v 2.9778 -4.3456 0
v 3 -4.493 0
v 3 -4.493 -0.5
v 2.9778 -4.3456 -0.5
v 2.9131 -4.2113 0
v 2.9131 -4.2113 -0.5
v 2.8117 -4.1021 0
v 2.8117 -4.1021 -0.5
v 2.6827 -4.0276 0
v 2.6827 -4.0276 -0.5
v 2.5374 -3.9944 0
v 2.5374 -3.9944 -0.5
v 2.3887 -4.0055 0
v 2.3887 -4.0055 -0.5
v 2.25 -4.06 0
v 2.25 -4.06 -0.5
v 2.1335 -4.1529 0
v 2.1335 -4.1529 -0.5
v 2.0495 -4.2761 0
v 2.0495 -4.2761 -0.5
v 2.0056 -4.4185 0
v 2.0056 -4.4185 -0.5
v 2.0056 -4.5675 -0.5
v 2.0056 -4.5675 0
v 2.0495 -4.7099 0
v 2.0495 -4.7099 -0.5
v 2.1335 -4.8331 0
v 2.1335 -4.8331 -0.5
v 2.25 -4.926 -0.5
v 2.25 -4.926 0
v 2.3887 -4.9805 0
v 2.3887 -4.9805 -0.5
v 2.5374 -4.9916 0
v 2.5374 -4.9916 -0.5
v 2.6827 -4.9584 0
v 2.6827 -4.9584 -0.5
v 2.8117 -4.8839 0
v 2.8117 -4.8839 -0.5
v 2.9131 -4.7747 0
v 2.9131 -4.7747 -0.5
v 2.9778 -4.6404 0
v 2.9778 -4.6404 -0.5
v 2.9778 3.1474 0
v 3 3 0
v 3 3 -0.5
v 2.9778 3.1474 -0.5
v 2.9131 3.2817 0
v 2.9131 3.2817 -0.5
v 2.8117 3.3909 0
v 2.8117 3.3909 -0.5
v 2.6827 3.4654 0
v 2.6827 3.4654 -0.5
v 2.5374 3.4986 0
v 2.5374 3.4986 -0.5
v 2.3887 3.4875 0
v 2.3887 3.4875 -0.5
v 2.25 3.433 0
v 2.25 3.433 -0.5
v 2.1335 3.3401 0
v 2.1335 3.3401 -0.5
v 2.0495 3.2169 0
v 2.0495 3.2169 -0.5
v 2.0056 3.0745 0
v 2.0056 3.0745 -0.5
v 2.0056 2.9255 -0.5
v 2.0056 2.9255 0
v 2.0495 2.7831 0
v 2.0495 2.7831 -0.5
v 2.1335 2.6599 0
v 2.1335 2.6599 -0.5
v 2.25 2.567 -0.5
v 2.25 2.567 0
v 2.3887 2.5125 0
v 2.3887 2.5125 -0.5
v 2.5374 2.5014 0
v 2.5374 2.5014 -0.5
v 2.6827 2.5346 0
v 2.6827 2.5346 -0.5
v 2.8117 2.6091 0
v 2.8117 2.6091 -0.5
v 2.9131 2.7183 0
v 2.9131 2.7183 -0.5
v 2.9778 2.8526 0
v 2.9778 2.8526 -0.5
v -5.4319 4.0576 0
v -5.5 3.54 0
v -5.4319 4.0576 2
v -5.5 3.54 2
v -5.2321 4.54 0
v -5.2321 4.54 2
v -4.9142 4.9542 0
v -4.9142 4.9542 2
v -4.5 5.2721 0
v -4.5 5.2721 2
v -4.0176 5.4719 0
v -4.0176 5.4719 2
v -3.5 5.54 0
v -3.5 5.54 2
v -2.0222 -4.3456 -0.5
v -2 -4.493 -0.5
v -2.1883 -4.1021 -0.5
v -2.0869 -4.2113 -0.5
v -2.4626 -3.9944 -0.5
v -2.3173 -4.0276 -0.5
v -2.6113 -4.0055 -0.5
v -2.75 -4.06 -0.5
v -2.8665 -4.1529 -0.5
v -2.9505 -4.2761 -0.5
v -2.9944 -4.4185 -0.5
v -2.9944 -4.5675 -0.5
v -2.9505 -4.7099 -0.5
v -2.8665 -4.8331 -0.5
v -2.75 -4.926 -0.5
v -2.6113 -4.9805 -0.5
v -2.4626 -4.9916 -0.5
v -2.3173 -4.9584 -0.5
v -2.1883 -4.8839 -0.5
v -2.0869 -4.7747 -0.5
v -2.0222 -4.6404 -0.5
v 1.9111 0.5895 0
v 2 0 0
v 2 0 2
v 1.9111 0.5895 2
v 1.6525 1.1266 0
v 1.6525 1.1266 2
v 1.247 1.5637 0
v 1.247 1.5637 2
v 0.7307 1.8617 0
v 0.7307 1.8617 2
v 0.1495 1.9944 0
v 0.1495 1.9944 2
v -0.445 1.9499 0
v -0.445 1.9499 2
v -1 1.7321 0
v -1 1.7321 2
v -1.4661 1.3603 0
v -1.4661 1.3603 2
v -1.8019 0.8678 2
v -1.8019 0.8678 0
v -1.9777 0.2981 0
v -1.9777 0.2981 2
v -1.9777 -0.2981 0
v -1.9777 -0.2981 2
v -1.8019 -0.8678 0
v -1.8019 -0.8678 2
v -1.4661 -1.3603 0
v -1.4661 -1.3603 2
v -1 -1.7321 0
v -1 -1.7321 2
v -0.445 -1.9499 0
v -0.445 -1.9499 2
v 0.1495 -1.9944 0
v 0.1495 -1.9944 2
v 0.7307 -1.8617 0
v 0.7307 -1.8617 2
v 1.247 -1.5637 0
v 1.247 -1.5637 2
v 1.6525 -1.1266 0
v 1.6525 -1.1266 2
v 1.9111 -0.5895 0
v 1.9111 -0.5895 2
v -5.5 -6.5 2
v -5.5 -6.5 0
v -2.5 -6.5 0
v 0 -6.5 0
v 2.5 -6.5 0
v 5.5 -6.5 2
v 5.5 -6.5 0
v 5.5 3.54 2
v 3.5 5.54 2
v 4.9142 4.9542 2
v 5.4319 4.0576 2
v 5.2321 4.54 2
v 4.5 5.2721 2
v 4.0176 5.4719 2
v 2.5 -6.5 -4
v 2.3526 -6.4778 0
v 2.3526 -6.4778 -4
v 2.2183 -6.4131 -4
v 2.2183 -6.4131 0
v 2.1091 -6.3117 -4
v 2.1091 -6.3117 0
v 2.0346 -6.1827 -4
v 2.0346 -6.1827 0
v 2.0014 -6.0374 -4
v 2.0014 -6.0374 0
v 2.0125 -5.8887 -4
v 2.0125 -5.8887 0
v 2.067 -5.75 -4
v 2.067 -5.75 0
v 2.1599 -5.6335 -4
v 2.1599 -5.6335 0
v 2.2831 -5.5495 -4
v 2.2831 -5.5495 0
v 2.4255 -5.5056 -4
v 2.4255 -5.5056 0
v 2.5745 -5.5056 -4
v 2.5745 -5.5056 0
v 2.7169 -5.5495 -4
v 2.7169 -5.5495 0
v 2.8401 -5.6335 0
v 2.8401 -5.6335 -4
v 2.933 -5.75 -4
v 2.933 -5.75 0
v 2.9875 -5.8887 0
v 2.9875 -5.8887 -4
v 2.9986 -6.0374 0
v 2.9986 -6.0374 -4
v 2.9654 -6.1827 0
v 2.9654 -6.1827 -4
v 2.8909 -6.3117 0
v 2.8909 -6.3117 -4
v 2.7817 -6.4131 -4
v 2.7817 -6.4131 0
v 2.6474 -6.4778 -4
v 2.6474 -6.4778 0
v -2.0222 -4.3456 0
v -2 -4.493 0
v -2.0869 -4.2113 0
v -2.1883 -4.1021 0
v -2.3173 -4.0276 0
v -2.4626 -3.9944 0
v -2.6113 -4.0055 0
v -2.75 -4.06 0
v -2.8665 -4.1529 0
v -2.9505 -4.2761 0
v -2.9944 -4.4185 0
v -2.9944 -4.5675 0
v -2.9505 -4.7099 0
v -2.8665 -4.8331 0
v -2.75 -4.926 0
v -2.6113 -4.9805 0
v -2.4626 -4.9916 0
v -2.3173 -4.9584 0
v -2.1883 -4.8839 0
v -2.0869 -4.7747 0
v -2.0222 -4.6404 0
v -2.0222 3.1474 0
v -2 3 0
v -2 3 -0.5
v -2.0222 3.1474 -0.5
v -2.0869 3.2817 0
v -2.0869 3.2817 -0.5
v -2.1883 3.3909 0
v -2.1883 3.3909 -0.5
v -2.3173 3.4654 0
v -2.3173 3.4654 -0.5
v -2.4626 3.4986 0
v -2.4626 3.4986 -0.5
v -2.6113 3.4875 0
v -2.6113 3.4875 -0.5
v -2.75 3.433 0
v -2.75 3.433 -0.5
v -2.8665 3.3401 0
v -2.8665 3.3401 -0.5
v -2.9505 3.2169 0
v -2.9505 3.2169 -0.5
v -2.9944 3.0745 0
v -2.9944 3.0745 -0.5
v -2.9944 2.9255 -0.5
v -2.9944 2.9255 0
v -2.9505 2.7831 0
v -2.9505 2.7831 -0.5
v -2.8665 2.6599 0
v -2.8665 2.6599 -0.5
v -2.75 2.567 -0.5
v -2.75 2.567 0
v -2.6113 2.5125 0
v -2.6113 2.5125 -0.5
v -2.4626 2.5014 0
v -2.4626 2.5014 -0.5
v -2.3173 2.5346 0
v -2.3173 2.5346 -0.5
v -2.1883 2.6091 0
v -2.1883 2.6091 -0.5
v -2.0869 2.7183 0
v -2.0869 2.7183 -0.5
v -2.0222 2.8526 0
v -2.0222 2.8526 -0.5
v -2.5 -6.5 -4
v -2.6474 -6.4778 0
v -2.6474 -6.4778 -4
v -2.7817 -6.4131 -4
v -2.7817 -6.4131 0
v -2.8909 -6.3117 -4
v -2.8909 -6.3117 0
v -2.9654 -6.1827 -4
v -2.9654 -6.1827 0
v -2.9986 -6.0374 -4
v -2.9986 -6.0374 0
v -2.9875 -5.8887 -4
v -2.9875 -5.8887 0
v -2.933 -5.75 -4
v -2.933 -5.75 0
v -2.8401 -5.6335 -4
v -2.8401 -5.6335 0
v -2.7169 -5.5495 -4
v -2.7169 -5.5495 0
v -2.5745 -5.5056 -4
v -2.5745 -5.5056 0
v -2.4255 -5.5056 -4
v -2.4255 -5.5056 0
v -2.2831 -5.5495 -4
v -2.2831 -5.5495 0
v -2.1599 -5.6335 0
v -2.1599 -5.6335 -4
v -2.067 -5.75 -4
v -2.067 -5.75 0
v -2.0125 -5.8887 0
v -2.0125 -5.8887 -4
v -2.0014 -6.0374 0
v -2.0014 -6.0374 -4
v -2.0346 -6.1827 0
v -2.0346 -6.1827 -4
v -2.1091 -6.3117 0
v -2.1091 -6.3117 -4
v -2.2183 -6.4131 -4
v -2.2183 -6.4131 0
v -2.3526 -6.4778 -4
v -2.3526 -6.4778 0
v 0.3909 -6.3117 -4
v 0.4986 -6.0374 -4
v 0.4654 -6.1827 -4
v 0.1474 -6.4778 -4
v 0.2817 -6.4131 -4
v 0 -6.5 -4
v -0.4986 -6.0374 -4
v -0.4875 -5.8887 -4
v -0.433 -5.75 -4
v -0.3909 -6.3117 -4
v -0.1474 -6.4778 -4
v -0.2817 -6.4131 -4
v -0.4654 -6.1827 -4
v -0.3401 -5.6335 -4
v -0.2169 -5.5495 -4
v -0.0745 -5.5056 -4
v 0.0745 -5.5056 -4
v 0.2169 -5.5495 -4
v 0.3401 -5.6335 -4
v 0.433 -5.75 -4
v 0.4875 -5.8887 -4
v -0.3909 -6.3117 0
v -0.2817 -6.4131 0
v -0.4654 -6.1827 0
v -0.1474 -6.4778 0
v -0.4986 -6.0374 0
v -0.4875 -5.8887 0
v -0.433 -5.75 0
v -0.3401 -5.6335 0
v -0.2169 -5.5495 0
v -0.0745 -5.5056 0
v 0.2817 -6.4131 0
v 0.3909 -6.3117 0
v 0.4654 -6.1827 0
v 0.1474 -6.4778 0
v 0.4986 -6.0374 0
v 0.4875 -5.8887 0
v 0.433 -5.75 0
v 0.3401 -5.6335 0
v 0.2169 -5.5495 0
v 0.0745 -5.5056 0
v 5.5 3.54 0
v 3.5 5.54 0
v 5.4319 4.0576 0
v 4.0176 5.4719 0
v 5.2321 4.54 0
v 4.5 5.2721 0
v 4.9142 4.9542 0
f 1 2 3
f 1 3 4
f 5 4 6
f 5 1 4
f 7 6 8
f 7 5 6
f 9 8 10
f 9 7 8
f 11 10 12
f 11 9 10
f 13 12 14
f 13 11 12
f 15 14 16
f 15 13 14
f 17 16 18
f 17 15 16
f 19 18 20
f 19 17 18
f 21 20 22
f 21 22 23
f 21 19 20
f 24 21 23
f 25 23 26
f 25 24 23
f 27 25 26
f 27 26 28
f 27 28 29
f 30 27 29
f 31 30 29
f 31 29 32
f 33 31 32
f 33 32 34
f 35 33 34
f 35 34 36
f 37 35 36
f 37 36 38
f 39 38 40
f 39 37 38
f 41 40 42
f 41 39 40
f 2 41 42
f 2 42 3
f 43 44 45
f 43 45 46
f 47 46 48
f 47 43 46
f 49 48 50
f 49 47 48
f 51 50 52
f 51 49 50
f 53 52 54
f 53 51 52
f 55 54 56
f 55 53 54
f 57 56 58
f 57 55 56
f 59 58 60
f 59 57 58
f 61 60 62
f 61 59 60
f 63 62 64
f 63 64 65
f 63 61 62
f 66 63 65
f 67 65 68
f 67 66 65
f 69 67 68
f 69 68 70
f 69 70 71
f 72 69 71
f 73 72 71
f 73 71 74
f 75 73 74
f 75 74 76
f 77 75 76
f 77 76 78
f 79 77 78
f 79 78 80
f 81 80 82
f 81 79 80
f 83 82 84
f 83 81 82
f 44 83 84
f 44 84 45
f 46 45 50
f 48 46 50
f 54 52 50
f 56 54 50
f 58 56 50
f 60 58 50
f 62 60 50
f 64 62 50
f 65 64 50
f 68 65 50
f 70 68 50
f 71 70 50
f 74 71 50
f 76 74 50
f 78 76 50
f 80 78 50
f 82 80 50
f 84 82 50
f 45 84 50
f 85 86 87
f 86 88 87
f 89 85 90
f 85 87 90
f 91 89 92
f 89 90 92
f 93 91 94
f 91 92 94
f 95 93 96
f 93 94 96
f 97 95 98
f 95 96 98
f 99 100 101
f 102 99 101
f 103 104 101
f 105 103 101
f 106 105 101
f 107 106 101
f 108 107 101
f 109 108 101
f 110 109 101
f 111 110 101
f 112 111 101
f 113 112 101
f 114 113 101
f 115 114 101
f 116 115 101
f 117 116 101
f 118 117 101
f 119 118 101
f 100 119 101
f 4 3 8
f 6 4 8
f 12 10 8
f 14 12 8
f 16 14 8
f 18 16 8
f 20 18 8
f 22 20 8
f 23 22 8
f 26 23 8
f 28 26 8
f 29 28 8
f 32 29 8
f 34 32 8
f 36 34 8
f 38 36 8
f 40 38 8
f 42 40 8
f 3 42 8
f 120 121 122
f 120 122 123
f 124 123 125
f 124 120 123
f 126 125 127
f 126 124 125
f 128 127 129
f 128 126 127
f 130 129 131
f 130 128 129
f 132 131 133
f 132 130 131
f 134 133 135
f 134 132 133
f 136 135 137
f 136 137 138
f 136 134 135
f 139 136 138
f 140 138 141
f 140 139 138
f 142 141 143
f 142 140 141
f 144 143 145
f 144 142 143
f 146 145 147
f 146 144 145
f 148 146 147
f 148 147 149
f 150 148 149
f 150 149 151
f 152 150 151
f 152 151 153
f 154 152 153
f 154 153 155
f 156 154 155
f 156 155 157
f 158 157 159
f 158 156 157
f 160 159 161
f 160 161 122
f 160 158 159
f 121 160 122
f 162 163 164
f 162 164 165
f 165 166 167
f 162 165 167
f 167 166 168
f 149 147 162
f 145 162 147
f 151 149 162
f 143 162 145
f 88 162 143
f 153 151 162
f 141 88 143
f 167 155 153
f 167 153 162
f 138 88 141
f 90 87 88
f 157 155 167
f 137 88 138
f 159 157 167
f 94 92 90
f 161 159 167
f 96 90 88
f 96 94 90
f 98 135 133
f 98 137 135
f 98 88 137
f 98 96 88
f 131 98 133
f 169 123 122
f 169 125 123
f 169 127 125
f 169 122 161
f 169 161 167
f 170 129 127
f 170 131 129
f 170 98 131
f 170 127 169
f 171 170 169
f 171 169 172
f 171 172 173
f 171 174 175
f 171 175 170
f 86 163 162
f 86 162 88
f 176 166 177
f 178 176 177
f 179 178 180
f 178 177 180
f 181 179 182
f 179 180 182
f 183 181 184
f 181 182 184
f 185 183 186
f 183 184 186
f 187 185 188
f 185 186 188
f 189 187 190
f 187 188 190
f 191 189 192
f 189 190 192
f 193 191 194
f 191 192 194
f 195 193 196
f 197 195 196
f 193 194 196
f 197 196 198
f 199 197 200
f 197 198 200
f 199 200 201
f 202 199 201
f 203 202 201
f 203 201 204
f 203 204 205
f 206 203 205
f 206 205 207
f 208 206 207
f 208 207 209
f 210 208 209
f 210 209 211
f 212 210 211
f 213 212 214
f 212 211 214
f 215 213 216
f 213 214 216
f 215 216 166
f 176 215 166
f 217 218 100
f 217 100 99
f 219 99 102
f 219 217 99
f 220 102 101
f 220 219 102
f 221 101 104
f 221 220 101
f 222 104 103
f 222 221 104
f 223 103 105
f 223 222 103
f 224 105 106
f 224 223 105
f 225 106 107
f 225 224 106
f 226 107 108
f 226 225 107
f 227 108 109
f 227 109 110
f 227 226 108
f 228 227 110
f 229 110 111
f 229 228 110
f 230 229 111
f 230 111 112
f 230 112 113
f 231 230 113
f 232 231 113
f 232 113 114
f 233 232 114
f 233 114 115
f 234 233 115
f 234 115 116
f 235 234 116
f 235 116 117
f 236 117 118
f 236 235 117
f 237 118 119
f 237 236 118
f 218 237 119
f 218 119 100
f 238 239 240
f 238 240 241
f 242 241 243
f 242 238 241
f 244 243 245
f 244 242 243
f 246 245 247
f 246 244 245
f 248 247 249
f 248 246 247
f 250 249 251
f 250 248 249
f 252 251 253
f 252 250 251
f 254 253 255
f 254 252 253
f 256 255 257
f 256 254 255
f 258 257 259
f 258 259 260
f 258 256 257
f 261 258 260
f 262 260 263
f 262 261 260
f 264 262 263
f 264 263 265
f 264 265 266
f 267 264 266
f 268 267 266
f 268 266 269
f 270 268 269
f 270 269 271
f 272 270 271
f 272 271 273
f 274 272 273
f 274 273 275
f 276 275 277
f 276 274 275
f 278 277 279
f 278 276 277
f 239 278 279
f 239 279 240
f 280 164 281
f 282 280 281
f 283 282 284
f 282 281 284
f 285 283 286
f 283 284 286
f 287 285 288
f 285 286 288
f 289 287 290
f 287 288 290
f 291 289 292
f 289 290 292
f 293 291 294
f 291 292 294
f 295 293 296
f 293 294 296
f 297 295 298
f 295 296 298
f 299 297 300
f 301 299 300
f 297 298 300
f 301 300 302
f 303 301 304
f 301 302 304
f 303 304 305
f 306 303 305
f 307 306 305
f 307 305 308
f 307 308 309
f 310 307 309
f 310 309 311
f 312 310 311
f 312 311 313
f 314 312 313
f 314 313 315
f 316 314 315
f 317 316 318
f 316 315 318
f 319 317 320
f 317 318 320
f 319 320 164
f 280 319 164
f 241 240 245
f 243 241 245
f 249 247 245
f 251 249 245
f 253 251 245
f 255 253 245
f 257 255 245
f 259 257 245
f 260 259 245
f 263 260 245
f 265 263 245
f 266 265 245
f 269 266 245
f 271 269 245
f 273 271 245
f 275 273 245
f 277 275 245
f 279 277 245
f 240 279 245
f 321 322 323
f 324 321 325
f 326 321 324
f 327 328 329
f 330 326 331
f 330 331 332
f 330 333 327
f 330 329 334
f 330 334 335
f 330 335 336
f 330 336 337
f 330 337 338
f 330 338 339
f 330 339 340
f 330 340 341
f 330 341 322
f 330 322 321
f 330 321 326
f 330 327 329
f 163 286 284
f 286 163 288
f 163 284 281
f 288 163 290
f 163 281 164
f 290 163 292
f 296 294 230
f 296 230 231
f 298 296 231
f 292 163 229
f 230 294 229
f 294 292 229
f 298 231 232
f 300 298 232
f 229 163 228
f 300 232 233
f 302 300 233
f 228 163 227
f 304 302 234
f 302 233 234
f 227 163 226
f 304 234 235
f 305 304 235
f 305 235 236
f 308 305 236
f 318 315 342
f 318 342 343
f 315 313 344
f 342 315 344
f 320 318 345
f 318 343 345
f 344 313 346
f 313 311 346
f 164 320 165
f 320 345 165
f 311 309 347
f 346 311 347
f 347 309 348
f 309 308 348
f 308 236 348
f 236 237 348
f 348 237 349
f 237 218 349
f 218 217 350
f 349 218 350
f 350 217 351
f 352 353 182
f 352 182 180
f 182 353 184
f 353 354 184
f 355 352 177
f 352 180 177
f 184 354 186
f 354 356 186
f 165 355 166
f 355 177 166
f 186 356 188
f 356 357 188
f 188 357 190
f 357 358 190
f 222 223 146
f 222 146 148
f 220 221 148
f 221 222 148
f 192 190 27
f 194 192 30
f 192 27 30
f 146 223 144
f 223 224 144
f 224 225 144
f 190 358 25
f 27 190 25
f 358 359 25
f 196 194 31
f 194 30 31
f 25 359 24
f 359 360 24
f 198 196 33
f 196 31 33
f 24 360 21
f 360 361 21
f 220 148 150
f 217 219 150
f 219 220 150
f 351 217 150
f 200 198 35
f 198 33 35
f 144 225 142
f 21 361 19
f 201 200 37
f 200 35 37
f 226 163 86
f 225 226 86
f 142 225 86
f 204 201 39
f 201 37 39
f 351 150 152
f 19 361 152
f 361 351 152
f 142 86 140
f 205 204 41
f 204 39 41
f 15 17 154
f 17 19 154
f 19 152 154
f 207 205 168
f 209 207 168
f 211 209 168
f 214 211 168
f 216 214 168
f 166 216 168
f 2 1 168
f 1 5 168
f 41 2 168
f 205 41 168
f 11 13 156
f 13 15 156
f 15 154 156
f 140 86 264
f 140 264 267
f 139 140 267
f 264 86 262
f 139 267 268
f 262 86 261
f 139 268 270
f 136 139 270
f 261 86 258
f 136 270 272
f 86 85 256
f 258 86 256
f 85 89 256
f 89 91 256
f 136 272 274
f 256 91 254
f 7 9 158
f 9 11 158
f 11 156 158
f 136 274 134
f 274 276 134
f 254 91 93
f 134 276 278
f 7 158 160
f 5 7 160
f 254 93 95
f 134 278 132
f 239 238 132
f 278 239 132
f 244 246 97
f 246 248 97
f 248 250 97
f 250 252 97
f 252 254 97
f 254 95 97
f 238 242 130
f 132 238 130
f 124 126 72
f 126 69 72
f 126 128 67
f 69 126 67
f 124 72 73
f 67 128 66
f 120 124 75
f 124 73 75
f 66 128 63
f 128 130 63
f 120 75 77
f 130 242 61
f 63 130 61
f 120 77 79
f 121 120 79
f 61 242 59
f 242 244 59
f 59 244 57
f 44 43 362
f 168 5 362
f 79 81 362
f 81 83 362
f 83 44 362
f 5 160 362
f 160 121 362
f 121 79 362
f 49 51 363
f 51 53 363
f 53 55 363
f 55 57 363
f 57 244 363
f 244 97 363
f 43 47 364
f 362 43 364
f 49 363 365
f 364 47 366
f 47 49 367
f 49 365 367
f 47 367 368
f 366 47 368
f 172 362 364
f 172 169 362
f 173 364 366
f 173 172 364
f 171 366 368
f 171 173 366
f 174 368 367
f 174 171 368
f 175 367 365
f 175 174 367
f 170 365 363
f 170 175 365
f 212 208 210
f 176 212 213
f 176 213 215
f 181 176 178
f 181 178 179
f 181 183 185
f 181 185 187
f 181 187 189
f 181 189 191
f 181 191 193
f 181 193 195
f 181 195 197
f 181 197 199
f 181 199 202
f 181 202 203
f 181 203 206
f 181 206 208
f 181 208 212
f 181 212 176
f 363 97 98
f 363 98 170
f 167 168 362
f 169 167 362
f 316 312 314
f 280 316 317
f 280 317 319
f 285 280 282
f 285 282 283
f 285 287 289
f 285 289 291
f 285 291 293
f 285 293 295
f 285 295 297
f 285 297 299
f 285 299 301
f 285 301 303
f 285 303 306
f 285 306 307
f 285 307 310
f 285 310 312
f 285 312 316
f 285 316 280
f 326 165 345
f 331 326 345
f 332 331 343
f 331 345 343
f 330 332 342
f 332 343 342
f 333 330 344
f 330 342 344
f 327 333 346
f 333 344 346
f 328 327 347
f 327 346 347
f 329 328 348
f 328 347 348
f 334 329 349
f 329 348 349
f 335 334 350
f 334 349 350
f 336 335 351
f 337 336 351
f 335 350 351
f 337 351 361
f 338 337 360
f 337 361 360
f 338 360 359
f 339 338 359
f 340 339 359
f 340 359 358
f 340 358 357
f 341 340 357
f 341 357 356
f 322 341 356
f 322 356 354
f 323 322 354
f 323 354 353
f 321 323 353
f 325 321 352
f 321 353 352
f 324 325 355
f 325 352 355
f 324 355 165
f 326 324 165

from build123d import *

# Parameters (mm, degrees)
SKETCH3_W           = 11
SKETCH3_H           = 12.04
BOSS_EXTRUDE1_DEPTH = 2
FILLET1_R           = 2
SKETCH4_R           = 2
CUT_EXTRUDE1_DEPTH  = 2
SKETCH5_R           = 0.5
BOSS_EXTRUDE2_DEPTH = 0.5
SKETCH6_R           = 0.5
BOSS_EXTRUDE3_DEPTH = 4


with BuildPart() as part:
    # Sketch3 → Boss-Extrude1 (new body)
    with BuildSketch(Plane.XY):
        with Locations((0, -0.48)):
            Rectangle(SKETCH3_W, SKETCH3_H)
    extrude(amount=BOSS_EXTRUDE1_DEPTH)

    # Fillet1
    fillet1_edges = [part.edges().sort_by_distance(p)[0] for p in [
        (-5.5, 5.54, 1),
        (5.5, 5.54, 1),
    ]]
    fillet(fillet1_edges, radius=FILLET1_R)

    # Sketch4 → Cut-Extrude1 (cut)
    with BuildSketch(Plane.XY):
        Circle(SKETCH4_R)
    extrude(amount=CUT_EXTRUDE1_DEPTH, mode=Mode.SUBTRACT)

    # Sketch5 → Boss-Extrude2 (add)
    with BuildSketch(Plane.XY):
        with Locations((2.5, 3)):
            Circle(SKETCH5_R)
        with Locations((-2.5, 3)):
            Circle(SKETCH5_R)
        with Locations((2.5, -4.493)):
            Circle(SKETCH5_R)
        with Locations((-2.5, -4.493)):
            Circle(SKETCH5_R)
    extrude(amount=-BOSS_EXTRUDE2_DEPTH)

    # Sketch6 → Boss-Extrude3 (add)
    with BuildSketch(Plane(origin=(0, 0, 0), x_dir=(-1, 0, 0), z_dir=(0, 0, -1))):
        with Locations(Location((0, -6, 0), (0, 0, 270))):
            Circle(SKETCH6_R)
        with Locations(Location((2.5, -6, 0), (0, 0, 270))):
            Circle(SKETCH6_R)
        with Locations(Location((-2.5, -6, 0), (0, 0, 270))):
            Circle(SKETCH6_R)
    extrude(amount=BOSS_EXTRUDE3_DEPTH)


solid = part.part
